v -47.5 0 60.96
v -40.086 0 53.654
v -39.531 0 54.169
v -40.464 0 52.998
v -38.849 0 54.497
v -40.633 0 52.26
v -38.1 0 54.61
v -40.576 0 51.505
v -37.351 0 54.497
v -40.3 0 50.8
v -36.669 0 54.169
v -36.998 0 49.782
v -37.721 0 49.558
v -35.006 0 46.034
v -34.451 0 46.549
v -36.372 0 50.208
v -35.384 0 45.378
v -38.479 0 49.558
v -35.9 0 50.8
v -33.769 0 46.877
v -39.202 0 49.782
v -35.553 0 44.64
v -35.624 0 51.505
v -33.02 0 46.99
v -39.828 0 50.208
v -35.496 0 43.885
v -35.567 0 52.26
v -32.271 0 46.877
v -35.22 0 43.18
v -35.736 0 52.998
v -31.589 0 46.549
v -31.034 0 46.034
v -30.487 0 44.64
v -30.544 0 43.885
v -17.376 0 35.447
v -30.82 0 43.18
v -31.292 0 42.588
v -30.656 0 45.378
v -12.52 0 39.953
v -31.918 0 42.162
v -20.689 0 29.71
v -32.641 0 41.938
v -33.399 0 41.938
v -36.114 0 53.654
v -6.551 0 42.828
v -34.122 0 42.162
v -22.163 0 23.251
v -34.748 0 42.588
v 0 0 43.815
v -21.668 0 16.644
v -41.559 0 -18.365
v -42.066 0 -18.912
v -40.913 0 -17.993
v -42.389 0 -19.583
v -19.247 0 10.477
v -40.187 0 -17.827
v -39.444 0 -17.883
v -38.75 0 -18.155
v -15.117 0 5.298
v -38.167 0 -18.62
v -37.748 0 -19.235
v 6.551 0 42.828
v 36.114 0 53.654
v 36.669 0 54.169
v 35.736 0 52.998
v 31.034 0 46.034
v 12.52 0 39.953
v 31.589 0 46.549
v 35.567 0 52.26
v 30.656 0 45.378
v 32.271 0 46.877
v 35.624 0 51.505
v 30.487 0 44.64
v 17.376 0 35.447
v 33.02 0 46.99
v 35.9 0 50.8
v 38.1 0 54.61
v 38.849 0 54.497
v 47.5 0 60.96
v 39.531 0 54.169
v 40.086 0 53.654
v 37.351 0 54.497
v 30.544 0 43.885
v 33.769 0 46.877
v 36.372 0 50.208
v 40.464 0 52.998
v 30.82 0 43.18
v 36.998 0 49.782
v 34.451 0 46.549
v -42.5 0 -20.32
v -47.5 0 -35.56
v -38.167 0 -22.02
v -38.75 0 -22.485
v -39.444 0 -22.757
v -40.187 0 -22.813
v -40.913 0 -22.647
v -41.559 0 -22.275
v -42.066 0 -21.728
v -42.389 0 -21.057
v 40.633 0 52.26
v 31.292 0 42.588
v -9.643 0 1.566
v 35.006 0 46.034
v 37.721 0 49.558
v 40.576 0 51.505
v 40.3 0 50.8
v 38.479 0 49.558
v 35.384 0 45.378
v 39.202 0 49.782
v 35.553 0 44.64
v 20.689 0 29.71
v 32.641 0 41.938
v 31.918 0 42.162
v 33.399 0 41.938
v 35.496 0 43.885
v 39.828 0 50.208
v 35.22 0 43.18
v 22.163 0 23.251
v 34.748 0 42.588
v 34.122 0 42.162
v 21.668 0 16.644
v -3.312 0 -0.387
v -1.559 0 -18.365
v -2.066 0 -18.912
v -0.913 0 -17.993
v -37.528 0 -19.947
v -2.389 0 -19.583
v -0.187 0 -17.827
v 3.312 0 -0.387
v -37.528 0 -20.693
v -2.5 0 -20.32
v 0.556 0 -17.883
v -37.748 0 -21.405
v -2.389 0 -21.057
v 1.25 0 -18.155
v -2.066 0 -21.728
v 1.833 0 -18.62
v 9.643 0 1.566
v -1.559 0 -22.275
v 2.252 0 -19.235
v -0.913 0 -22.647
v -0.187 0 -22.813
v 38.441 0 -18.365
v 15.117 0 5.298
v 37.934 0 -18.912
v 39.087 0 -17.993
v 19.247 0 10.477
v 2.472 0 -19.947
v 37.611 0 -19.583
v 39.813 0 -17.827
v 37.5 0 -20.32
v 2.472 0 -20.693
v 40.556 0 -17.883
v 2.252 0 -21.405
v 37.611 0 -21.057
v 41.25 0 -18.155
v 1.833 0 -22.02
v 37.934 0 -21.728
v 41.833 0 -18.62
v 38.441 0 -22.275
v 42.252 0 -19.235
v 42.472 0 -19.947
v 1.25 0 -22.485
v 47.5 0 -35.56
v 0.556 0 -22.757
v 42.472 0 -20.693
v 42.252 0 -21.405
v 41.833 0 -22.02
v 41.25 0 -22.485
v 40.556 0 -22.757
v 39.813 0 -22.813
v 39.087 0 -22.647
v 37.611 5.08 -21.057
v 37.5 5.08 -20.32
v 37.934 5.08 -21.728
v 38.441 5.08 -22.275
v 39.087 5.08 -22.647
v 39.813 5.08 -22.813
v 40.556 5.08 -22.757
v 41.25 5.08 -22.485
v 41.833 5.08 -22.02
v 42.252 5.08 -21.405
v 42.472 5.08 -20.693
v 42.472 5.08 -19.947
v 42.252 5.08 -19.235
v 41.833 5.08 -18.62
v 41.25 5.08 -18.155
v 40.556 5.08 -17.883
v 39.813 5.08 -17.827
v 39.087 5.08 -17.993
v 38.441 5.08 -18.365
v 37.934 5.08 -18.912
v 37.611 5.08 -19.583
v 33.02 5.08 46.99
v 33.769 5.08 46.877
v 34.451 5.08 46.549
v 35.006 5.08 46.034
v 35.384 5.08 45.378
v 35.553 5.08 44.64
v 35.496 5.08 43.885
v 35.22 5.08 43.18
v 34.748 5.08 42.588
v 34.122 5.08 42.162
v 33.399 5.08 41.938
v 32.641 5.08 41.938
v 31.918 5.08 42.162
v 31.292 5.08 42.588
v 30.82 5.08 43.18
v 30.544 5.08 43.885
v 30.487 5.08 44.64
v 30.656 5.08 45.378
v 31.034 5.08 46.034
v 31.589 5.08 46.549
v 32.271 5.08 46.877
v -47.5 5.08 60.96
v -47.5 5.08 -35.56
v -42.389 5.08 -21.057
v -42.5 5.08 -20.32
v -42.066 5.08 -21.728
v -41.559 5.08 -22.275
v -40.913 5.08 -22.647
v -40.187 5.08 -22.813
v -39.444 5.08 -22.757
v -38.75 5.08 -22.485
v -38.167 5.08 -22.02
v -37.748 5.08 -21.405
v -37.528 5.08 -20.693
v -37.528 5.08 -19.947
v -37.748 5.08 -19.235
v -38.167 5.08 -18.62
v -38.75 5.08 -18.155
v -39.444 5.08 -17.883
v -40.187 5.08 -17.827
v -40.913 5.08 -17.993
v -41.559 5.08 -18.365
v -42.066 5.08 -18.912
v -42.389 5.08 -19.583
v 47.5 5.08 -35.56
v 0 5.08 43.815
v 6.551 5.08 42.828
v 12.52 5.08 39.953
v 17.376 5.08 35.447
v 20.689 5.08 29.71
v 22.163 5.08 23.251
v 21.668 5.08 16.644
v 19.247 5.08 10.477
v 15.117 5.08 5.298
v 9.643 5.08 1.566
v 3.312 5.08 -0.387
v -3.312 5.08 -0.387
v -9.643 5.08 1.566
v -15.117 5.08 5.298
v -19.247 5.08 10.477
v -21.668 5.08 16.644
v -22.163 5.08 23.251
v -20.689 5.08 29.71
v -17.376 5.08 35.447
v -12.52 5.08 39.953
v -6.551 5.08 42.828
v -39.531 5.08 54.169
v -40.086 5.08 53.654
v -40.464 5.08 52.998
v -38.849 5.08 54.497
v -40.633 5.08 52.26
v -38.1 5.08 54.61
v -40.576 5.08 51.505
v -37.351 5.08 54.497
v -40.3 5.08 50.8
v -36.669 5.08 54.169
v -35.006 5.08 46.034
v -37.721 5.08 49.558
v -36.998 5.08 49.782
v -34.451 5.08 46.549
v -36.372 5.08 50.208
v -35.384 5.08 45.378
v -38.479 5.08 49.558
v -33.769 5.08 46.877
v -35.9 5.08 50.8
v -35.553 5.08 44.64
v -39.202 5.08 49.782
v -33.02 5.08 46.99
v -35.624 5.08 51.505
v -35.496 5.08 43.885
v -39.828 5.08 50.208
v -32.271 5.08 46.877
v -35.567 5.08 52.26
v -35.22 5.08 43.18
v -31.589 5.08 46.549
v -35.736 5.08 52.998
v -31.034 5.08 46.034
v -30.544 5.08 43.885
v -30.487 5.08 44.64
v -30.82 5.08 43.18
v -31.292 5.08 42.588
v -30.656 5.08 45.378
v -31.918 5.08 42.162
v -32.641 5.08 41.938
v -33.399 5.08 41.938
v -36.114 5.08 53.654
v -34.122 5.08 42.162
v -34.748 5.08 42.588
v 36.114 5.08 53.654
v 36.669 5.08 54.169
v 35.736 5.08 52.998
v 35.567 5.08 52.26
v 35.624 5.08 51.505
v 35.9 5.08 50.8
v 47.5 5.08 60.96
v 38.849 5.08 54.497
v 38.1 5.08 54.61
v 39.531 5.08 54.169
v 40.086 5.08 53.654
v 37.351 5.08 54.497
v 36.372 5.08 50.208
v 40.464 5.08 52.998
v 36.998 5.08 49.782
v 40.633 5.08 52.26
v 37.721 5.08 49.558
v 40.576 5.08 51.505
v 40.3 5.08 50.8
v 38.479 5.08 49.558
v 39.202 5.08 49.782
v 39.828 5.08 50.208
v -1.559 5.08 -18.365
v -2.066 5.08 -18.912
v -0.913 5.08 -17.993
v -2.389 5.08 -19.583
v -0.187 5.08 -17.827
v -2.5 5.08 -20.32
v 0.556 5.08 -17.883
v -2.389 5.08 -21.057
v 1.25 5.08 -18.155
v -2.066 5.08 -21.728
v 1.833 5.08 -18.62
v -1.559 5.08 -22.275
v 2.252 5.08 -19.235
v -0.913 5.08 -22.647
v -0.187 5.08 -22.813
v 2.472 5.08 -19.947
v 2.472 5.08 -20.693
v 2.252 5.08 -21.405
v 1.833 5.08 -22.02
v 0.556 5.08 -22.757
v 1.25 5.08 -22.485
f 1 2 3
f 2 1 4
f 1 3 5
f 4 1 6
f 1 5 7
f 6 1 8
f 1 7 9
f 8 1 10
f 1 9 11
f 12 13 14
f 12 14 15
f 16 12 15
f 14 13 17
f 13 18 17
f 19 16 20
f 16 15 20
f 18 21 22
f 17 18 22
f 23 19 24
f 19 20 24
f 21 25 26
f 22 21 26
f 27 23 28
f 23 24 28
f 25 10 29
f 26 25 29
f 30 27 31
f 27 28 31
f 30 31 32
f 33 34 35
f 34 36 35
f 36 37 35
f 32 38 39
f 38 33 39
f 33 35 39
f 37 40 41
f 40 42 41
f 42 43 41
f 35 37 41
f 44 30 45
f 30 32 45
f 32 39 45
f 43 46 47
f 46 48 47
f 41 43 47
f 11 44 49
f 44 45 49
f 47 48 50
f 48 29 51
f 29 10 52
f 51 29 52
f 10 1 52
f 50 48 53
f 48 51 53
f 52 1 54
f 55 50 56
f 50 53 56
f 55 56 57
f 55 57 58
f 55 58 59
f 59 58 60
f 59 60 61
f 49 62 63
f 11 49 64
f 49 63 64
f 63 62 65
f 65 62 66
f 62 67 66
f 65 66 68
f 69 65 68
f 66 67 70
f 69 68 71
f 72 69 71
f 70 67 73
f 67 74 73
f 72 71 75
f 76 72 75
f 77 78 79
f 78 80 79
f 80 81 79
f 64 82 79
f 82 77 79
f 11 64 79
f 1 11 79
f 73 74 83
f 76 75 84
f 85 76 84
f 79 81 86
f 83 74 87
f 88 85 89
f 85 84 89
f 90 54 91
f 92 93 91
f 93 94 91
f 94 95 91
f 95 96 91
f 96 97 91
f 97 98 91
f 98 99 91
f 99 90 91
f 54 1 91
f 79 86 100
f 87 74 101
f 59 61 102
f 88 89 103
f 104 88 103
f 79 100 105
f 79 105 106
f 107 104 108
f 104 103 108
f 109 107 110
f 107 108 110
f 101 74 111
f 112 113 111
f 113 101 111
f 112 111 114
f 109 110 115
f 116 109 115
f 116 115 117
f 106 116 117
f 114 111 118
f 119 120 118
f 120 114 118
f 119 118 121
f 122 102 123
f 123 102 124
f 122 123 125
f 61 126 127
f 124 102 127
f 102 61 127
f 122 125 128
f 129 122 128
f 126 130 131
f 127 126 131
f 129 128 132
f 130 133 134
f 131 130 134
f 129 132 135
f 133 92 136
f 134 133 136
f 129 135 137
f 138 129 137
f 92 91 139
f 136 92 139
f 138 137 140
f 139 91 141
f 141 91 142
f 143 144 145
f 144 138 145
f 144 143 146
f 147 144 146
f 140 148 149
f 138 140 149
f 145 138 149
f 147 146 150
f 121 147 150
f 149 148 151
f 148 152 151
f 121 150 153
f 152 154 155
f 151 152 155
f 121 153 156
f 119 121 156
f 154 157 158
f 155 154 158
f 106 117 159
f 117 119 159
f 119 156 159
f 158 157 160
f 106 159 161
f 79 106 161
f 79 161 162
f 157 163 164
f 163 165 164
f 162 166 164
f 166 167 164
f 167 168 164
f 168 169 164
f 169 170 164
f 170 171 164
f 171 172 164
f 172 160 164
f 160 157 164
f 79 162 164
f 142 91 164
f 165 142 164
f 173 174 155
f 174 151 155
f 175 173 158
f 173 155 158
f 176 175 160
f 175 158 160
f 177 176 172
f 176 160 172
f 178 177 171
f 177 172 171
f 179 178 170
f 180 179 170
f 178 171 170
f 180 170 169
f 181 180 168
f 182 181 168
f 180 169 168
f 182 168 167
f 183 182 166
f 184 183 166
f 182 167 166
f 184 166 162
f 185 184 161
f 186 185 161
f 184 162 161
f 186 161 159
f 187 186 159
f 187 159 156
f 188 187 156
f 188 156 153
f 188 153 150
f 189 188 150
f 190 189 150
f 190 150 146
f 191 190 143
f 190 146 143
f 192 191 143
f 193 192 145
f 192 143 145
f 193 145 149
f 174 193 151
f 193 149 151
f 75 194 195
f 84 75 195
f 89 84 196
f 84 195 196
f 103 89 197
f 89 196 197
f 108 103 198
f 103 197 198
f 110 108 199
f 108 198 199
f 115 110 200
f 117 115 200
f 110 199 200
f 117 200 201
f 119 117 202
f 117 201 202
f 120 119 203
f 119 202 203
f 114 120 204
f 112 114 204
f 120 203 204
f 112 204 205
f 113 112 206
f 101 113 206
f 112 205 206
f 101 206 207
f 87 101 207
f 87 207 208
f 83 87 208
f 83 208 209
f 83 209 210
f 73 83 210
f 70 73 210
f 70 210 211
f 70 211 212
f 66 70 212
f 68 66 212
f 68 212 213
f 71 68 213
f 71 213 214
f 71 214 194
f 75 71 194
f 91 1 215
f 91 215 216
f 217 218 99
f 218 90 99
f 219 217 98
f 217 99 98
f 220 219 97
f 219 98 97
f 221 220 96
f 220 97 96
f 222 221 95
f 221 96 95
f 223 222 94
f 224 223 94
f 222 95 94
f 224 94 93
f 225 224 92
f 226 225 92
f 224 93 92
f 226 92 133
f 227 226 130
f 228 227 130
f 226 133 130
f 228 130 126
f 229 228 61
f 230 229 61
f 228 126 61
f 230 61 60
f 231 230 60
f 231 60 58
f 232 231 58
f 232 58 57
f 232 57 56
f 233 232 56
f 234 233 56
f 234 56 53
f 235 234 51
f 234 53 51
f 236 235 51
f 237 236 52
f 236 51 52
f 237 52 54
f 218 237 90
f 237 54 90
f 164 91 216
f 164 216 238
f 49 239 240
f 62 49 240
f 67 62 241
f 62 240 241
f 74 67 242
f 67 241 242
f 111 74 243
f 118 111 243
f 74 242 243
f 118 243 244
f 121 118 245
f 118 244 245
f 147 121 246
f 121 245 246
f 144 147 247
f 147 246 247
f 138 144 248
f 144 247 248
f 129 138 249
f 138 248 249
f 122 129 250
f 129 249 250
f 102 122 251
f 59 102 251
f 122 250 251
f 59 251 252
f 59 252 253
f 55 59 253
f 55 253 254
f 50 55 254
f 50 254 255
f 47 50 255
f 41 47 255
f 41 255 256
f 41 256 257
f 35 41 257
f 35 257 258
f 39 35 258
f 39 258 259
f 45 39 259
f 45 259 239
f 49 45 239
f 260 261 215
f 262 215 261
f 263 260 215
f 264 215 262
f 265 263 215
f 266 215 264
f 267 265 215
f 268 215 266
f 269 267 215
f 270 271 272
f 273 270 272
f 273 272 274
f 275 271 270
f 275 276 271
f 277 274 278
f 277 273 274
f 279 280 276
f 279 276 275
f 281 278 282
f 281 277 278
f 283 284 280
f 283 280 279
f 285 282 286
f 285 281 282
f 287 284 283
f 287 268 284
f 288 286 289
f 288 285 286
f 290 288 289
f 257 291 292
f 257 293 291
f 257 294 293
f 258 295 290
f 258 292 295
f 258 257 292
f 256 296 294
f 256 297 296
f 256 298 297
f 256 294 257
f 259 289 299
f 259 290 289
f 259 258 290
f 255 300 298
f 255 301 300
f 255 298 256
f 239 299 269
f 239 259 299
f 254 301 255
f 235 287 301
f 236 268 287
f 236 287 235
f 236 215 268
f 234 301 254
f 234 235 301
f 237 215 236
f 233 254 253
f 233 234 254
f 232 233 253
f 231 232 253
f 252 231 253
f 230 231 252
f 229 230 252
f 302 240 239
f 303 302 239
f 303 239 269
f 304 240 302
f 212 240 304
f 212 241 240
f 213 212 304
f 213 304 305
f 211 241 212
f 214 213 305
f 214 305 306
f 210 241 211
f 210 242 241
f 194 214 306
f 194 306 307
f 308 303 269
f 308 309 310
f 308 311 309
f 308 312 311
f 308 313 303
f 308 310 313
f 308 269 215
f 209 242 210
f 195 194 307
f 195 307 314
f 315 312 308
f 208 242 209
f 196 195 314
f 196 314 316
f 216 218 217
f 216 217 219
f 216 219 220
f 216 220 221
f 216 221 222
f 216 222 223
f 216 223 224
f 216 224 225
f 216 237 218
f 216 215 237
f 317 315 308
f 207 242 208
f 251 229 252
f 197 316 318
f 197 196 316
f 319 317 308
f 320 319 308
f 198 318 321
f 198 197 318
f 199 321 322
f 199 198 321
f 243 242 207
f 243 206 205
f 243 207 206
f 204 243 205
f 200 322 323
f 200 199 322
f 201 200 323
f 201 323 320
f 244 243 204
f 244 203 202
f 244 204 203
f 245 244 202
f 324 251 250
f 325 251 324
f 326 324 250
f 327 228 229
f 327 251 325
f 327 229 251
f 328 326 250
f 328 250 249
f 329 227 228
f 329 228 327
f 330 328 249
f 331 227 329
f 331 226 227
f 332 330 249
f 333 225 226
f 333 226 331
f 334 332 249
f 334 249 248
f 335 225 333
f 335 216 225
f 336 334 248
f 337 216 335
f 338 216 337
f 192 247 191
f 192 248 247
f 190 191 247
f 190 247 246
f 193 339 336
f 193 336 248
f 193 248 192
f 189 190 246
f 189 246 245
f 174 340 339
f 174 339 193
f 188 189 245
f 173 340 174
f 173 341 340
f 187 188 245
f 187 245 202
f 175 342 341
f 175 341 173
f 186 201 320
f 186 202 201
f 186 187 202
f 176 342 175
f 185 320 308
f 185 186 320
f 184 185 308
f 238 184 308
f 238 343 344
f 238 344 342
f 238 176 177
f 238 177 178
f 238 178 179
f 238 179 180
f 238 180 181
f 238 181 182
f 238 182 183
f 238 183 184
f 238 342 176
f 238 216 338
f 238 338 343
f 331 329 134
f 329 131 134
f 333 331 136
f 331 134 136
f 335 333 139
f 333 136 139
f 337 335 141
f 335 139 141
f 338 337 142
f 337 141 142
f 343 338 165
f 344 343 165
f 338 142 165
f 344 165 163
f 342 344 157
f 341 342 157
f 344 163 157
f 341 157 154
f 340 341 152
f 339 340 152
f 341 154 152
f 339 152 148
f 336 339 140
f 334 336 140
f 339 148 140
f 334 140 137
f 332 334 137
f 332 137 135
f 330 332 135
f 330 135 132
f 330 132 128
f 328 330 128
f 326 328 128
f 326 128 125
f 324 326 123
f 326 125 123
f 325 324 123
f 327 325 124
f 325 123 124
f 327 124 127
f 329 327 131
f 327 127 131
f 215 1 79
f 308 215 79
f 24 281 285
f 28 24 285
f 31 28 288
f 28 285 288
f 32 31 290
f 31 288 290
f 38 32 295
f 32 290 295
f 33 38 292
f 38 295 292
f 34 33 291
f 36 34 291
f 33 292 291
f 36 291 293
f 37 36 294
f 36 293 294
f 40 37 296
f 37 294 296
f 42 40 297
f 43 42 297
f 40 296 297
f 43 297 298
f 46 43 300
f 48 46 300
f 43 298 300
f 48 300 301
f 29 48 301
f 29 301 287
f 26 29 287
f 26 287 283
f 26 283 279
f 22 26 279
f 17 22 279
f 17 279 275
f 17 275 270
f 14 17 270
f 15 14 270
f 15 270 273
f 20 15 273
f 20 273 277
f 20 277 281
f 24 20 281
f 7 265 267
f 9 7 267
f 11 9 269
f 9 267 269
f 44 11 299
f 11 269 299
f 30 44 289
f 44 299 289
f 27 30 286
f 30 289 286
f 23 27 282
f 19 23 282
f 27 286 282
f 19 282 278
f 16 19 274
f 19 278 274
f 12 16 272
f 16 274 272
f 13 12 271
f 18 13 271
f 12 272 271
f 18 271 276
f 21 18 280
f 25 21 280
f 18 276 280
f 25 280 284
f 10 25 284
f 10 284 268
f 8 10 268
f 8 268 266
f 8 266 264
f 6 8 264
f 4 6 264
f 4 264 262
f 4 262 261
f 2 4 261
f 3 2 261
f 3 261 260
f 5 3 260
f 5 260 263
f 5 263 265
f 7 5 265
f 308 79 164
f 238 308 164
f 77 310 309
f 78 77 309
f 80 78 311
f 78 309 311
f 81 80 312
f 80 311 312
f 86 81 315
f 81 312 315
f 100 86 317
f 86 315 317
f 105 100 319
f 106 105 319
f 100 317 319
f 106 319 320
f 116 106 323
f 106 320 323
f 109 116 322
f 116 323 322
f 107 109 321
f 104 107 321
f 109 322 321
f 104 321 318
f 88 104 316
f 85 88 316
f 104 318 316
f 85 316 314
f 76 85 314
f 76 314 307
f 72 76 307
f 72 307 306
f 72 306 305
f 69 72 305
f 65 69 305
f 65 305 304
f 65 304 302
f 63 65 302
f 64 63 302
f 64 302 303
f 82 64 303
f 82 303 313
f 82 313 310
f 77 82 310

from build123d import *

# Parameters (mm, degrees)
SKETCH2_W                 = 95
SKETCH2_H                 = 96.52
BOSS_EXTRUDE3_DEPTH       = 5.08
SKETCH3_R                 = 22.225
CUT_EXTRUDE1_DEPTH        = 78.447905072
M6X1_0_TAPPED_HOLE1_D     = 5
M6X1_0_TAPPED_HOLE1_DEPTH = 5.08
M6X1_0_TAPPED_HOLE1_TIP   = 1.502151548
SKETCH7_R                 = 2.54
CUT_EXTRUDE2_DEPTH        = 7.62


with BuildPart() as part:
    # Sketch2 → Boss-Extrude3 (new body)
    with BuildSketch(Plane(origin=(0, 0, 0), x_dir=(1, 0, 0), z_dir=(0, 1, 0))):
        with Locations((0, -12.7)):
            Rectangle(SKETCH2_W, SKETCH2_H)
    extrude(amount=BOSS_EXTRUDE3_DEPTH)

    # Sketch3 → Cut-Extrude1 (cut, through all)
    with BuildSketch(Plane(origin=(0, 5.08, 0), x_dir=(1, 0, 0), z_dir=(0, 1, 0))):
        with Locations(Location((0, -21.59, 0), (0, 0, 270))):
            Circle(SKETCH3_R)
    extrude(amount=-CUT_EXTRUDE1_DEPTH, mode=Mode.SUBTRACT)

    # M6x1.0 Tapped Hole1
    with Locations(Plane(origin=(0, 5.08, 0), x_dir=(1, 0, 0), z_dir=(0, 1, 0))):
        with Locations((-40, 20.32), (40, 20.32), (0, 20.32)):
            Hole(M6X1_0_TAPPED_HOLE1_D / 2, depth=M6X1_0_TAPPED_HOLE1_DEPTH)
            with Locations((0, 0, -(M6X1_0_TAPPED_HOLE1_DEPTH + M6X1_0_TAPPED_HOLE1_TIP / 2))):  # 118° drill point
                Cone(0, M6X1_0_TAPPED_HOLE1_D / 2, M6X1_0_TAPPED_HOLE1_TIP, mode=Mode.SUBTRACT)

    # Sketch7 → Cut-Extrude2 (cut)
    with BuildSketch(Plane(origin=(0, 5.08, 0), x_dir=(1, 0, 0), z_dir=(0, 1, 0))):
        with Locations(Location((-33.02, -44.45, 0), (0, 0, 270))):
            Circle(SKETCH7_R)
        with Locations(Location((33.02, -44.45, 0), (0, 0, 270))):
            Circle(SKETCH7_R)
        with Locations(Location((-38.1, -52.07, 0), (0, 0, 270))):
            Circle(SKETCH7_R)
        with Locations(Location((38.1, -52.07, 0), (0, 0, 270))):
            Circle(SKETCH7_R)
    extrude(amount=-CUT_EXTRUDE2_DEPTH, mode=Mode.SUBTRACT)


solid = part.part
